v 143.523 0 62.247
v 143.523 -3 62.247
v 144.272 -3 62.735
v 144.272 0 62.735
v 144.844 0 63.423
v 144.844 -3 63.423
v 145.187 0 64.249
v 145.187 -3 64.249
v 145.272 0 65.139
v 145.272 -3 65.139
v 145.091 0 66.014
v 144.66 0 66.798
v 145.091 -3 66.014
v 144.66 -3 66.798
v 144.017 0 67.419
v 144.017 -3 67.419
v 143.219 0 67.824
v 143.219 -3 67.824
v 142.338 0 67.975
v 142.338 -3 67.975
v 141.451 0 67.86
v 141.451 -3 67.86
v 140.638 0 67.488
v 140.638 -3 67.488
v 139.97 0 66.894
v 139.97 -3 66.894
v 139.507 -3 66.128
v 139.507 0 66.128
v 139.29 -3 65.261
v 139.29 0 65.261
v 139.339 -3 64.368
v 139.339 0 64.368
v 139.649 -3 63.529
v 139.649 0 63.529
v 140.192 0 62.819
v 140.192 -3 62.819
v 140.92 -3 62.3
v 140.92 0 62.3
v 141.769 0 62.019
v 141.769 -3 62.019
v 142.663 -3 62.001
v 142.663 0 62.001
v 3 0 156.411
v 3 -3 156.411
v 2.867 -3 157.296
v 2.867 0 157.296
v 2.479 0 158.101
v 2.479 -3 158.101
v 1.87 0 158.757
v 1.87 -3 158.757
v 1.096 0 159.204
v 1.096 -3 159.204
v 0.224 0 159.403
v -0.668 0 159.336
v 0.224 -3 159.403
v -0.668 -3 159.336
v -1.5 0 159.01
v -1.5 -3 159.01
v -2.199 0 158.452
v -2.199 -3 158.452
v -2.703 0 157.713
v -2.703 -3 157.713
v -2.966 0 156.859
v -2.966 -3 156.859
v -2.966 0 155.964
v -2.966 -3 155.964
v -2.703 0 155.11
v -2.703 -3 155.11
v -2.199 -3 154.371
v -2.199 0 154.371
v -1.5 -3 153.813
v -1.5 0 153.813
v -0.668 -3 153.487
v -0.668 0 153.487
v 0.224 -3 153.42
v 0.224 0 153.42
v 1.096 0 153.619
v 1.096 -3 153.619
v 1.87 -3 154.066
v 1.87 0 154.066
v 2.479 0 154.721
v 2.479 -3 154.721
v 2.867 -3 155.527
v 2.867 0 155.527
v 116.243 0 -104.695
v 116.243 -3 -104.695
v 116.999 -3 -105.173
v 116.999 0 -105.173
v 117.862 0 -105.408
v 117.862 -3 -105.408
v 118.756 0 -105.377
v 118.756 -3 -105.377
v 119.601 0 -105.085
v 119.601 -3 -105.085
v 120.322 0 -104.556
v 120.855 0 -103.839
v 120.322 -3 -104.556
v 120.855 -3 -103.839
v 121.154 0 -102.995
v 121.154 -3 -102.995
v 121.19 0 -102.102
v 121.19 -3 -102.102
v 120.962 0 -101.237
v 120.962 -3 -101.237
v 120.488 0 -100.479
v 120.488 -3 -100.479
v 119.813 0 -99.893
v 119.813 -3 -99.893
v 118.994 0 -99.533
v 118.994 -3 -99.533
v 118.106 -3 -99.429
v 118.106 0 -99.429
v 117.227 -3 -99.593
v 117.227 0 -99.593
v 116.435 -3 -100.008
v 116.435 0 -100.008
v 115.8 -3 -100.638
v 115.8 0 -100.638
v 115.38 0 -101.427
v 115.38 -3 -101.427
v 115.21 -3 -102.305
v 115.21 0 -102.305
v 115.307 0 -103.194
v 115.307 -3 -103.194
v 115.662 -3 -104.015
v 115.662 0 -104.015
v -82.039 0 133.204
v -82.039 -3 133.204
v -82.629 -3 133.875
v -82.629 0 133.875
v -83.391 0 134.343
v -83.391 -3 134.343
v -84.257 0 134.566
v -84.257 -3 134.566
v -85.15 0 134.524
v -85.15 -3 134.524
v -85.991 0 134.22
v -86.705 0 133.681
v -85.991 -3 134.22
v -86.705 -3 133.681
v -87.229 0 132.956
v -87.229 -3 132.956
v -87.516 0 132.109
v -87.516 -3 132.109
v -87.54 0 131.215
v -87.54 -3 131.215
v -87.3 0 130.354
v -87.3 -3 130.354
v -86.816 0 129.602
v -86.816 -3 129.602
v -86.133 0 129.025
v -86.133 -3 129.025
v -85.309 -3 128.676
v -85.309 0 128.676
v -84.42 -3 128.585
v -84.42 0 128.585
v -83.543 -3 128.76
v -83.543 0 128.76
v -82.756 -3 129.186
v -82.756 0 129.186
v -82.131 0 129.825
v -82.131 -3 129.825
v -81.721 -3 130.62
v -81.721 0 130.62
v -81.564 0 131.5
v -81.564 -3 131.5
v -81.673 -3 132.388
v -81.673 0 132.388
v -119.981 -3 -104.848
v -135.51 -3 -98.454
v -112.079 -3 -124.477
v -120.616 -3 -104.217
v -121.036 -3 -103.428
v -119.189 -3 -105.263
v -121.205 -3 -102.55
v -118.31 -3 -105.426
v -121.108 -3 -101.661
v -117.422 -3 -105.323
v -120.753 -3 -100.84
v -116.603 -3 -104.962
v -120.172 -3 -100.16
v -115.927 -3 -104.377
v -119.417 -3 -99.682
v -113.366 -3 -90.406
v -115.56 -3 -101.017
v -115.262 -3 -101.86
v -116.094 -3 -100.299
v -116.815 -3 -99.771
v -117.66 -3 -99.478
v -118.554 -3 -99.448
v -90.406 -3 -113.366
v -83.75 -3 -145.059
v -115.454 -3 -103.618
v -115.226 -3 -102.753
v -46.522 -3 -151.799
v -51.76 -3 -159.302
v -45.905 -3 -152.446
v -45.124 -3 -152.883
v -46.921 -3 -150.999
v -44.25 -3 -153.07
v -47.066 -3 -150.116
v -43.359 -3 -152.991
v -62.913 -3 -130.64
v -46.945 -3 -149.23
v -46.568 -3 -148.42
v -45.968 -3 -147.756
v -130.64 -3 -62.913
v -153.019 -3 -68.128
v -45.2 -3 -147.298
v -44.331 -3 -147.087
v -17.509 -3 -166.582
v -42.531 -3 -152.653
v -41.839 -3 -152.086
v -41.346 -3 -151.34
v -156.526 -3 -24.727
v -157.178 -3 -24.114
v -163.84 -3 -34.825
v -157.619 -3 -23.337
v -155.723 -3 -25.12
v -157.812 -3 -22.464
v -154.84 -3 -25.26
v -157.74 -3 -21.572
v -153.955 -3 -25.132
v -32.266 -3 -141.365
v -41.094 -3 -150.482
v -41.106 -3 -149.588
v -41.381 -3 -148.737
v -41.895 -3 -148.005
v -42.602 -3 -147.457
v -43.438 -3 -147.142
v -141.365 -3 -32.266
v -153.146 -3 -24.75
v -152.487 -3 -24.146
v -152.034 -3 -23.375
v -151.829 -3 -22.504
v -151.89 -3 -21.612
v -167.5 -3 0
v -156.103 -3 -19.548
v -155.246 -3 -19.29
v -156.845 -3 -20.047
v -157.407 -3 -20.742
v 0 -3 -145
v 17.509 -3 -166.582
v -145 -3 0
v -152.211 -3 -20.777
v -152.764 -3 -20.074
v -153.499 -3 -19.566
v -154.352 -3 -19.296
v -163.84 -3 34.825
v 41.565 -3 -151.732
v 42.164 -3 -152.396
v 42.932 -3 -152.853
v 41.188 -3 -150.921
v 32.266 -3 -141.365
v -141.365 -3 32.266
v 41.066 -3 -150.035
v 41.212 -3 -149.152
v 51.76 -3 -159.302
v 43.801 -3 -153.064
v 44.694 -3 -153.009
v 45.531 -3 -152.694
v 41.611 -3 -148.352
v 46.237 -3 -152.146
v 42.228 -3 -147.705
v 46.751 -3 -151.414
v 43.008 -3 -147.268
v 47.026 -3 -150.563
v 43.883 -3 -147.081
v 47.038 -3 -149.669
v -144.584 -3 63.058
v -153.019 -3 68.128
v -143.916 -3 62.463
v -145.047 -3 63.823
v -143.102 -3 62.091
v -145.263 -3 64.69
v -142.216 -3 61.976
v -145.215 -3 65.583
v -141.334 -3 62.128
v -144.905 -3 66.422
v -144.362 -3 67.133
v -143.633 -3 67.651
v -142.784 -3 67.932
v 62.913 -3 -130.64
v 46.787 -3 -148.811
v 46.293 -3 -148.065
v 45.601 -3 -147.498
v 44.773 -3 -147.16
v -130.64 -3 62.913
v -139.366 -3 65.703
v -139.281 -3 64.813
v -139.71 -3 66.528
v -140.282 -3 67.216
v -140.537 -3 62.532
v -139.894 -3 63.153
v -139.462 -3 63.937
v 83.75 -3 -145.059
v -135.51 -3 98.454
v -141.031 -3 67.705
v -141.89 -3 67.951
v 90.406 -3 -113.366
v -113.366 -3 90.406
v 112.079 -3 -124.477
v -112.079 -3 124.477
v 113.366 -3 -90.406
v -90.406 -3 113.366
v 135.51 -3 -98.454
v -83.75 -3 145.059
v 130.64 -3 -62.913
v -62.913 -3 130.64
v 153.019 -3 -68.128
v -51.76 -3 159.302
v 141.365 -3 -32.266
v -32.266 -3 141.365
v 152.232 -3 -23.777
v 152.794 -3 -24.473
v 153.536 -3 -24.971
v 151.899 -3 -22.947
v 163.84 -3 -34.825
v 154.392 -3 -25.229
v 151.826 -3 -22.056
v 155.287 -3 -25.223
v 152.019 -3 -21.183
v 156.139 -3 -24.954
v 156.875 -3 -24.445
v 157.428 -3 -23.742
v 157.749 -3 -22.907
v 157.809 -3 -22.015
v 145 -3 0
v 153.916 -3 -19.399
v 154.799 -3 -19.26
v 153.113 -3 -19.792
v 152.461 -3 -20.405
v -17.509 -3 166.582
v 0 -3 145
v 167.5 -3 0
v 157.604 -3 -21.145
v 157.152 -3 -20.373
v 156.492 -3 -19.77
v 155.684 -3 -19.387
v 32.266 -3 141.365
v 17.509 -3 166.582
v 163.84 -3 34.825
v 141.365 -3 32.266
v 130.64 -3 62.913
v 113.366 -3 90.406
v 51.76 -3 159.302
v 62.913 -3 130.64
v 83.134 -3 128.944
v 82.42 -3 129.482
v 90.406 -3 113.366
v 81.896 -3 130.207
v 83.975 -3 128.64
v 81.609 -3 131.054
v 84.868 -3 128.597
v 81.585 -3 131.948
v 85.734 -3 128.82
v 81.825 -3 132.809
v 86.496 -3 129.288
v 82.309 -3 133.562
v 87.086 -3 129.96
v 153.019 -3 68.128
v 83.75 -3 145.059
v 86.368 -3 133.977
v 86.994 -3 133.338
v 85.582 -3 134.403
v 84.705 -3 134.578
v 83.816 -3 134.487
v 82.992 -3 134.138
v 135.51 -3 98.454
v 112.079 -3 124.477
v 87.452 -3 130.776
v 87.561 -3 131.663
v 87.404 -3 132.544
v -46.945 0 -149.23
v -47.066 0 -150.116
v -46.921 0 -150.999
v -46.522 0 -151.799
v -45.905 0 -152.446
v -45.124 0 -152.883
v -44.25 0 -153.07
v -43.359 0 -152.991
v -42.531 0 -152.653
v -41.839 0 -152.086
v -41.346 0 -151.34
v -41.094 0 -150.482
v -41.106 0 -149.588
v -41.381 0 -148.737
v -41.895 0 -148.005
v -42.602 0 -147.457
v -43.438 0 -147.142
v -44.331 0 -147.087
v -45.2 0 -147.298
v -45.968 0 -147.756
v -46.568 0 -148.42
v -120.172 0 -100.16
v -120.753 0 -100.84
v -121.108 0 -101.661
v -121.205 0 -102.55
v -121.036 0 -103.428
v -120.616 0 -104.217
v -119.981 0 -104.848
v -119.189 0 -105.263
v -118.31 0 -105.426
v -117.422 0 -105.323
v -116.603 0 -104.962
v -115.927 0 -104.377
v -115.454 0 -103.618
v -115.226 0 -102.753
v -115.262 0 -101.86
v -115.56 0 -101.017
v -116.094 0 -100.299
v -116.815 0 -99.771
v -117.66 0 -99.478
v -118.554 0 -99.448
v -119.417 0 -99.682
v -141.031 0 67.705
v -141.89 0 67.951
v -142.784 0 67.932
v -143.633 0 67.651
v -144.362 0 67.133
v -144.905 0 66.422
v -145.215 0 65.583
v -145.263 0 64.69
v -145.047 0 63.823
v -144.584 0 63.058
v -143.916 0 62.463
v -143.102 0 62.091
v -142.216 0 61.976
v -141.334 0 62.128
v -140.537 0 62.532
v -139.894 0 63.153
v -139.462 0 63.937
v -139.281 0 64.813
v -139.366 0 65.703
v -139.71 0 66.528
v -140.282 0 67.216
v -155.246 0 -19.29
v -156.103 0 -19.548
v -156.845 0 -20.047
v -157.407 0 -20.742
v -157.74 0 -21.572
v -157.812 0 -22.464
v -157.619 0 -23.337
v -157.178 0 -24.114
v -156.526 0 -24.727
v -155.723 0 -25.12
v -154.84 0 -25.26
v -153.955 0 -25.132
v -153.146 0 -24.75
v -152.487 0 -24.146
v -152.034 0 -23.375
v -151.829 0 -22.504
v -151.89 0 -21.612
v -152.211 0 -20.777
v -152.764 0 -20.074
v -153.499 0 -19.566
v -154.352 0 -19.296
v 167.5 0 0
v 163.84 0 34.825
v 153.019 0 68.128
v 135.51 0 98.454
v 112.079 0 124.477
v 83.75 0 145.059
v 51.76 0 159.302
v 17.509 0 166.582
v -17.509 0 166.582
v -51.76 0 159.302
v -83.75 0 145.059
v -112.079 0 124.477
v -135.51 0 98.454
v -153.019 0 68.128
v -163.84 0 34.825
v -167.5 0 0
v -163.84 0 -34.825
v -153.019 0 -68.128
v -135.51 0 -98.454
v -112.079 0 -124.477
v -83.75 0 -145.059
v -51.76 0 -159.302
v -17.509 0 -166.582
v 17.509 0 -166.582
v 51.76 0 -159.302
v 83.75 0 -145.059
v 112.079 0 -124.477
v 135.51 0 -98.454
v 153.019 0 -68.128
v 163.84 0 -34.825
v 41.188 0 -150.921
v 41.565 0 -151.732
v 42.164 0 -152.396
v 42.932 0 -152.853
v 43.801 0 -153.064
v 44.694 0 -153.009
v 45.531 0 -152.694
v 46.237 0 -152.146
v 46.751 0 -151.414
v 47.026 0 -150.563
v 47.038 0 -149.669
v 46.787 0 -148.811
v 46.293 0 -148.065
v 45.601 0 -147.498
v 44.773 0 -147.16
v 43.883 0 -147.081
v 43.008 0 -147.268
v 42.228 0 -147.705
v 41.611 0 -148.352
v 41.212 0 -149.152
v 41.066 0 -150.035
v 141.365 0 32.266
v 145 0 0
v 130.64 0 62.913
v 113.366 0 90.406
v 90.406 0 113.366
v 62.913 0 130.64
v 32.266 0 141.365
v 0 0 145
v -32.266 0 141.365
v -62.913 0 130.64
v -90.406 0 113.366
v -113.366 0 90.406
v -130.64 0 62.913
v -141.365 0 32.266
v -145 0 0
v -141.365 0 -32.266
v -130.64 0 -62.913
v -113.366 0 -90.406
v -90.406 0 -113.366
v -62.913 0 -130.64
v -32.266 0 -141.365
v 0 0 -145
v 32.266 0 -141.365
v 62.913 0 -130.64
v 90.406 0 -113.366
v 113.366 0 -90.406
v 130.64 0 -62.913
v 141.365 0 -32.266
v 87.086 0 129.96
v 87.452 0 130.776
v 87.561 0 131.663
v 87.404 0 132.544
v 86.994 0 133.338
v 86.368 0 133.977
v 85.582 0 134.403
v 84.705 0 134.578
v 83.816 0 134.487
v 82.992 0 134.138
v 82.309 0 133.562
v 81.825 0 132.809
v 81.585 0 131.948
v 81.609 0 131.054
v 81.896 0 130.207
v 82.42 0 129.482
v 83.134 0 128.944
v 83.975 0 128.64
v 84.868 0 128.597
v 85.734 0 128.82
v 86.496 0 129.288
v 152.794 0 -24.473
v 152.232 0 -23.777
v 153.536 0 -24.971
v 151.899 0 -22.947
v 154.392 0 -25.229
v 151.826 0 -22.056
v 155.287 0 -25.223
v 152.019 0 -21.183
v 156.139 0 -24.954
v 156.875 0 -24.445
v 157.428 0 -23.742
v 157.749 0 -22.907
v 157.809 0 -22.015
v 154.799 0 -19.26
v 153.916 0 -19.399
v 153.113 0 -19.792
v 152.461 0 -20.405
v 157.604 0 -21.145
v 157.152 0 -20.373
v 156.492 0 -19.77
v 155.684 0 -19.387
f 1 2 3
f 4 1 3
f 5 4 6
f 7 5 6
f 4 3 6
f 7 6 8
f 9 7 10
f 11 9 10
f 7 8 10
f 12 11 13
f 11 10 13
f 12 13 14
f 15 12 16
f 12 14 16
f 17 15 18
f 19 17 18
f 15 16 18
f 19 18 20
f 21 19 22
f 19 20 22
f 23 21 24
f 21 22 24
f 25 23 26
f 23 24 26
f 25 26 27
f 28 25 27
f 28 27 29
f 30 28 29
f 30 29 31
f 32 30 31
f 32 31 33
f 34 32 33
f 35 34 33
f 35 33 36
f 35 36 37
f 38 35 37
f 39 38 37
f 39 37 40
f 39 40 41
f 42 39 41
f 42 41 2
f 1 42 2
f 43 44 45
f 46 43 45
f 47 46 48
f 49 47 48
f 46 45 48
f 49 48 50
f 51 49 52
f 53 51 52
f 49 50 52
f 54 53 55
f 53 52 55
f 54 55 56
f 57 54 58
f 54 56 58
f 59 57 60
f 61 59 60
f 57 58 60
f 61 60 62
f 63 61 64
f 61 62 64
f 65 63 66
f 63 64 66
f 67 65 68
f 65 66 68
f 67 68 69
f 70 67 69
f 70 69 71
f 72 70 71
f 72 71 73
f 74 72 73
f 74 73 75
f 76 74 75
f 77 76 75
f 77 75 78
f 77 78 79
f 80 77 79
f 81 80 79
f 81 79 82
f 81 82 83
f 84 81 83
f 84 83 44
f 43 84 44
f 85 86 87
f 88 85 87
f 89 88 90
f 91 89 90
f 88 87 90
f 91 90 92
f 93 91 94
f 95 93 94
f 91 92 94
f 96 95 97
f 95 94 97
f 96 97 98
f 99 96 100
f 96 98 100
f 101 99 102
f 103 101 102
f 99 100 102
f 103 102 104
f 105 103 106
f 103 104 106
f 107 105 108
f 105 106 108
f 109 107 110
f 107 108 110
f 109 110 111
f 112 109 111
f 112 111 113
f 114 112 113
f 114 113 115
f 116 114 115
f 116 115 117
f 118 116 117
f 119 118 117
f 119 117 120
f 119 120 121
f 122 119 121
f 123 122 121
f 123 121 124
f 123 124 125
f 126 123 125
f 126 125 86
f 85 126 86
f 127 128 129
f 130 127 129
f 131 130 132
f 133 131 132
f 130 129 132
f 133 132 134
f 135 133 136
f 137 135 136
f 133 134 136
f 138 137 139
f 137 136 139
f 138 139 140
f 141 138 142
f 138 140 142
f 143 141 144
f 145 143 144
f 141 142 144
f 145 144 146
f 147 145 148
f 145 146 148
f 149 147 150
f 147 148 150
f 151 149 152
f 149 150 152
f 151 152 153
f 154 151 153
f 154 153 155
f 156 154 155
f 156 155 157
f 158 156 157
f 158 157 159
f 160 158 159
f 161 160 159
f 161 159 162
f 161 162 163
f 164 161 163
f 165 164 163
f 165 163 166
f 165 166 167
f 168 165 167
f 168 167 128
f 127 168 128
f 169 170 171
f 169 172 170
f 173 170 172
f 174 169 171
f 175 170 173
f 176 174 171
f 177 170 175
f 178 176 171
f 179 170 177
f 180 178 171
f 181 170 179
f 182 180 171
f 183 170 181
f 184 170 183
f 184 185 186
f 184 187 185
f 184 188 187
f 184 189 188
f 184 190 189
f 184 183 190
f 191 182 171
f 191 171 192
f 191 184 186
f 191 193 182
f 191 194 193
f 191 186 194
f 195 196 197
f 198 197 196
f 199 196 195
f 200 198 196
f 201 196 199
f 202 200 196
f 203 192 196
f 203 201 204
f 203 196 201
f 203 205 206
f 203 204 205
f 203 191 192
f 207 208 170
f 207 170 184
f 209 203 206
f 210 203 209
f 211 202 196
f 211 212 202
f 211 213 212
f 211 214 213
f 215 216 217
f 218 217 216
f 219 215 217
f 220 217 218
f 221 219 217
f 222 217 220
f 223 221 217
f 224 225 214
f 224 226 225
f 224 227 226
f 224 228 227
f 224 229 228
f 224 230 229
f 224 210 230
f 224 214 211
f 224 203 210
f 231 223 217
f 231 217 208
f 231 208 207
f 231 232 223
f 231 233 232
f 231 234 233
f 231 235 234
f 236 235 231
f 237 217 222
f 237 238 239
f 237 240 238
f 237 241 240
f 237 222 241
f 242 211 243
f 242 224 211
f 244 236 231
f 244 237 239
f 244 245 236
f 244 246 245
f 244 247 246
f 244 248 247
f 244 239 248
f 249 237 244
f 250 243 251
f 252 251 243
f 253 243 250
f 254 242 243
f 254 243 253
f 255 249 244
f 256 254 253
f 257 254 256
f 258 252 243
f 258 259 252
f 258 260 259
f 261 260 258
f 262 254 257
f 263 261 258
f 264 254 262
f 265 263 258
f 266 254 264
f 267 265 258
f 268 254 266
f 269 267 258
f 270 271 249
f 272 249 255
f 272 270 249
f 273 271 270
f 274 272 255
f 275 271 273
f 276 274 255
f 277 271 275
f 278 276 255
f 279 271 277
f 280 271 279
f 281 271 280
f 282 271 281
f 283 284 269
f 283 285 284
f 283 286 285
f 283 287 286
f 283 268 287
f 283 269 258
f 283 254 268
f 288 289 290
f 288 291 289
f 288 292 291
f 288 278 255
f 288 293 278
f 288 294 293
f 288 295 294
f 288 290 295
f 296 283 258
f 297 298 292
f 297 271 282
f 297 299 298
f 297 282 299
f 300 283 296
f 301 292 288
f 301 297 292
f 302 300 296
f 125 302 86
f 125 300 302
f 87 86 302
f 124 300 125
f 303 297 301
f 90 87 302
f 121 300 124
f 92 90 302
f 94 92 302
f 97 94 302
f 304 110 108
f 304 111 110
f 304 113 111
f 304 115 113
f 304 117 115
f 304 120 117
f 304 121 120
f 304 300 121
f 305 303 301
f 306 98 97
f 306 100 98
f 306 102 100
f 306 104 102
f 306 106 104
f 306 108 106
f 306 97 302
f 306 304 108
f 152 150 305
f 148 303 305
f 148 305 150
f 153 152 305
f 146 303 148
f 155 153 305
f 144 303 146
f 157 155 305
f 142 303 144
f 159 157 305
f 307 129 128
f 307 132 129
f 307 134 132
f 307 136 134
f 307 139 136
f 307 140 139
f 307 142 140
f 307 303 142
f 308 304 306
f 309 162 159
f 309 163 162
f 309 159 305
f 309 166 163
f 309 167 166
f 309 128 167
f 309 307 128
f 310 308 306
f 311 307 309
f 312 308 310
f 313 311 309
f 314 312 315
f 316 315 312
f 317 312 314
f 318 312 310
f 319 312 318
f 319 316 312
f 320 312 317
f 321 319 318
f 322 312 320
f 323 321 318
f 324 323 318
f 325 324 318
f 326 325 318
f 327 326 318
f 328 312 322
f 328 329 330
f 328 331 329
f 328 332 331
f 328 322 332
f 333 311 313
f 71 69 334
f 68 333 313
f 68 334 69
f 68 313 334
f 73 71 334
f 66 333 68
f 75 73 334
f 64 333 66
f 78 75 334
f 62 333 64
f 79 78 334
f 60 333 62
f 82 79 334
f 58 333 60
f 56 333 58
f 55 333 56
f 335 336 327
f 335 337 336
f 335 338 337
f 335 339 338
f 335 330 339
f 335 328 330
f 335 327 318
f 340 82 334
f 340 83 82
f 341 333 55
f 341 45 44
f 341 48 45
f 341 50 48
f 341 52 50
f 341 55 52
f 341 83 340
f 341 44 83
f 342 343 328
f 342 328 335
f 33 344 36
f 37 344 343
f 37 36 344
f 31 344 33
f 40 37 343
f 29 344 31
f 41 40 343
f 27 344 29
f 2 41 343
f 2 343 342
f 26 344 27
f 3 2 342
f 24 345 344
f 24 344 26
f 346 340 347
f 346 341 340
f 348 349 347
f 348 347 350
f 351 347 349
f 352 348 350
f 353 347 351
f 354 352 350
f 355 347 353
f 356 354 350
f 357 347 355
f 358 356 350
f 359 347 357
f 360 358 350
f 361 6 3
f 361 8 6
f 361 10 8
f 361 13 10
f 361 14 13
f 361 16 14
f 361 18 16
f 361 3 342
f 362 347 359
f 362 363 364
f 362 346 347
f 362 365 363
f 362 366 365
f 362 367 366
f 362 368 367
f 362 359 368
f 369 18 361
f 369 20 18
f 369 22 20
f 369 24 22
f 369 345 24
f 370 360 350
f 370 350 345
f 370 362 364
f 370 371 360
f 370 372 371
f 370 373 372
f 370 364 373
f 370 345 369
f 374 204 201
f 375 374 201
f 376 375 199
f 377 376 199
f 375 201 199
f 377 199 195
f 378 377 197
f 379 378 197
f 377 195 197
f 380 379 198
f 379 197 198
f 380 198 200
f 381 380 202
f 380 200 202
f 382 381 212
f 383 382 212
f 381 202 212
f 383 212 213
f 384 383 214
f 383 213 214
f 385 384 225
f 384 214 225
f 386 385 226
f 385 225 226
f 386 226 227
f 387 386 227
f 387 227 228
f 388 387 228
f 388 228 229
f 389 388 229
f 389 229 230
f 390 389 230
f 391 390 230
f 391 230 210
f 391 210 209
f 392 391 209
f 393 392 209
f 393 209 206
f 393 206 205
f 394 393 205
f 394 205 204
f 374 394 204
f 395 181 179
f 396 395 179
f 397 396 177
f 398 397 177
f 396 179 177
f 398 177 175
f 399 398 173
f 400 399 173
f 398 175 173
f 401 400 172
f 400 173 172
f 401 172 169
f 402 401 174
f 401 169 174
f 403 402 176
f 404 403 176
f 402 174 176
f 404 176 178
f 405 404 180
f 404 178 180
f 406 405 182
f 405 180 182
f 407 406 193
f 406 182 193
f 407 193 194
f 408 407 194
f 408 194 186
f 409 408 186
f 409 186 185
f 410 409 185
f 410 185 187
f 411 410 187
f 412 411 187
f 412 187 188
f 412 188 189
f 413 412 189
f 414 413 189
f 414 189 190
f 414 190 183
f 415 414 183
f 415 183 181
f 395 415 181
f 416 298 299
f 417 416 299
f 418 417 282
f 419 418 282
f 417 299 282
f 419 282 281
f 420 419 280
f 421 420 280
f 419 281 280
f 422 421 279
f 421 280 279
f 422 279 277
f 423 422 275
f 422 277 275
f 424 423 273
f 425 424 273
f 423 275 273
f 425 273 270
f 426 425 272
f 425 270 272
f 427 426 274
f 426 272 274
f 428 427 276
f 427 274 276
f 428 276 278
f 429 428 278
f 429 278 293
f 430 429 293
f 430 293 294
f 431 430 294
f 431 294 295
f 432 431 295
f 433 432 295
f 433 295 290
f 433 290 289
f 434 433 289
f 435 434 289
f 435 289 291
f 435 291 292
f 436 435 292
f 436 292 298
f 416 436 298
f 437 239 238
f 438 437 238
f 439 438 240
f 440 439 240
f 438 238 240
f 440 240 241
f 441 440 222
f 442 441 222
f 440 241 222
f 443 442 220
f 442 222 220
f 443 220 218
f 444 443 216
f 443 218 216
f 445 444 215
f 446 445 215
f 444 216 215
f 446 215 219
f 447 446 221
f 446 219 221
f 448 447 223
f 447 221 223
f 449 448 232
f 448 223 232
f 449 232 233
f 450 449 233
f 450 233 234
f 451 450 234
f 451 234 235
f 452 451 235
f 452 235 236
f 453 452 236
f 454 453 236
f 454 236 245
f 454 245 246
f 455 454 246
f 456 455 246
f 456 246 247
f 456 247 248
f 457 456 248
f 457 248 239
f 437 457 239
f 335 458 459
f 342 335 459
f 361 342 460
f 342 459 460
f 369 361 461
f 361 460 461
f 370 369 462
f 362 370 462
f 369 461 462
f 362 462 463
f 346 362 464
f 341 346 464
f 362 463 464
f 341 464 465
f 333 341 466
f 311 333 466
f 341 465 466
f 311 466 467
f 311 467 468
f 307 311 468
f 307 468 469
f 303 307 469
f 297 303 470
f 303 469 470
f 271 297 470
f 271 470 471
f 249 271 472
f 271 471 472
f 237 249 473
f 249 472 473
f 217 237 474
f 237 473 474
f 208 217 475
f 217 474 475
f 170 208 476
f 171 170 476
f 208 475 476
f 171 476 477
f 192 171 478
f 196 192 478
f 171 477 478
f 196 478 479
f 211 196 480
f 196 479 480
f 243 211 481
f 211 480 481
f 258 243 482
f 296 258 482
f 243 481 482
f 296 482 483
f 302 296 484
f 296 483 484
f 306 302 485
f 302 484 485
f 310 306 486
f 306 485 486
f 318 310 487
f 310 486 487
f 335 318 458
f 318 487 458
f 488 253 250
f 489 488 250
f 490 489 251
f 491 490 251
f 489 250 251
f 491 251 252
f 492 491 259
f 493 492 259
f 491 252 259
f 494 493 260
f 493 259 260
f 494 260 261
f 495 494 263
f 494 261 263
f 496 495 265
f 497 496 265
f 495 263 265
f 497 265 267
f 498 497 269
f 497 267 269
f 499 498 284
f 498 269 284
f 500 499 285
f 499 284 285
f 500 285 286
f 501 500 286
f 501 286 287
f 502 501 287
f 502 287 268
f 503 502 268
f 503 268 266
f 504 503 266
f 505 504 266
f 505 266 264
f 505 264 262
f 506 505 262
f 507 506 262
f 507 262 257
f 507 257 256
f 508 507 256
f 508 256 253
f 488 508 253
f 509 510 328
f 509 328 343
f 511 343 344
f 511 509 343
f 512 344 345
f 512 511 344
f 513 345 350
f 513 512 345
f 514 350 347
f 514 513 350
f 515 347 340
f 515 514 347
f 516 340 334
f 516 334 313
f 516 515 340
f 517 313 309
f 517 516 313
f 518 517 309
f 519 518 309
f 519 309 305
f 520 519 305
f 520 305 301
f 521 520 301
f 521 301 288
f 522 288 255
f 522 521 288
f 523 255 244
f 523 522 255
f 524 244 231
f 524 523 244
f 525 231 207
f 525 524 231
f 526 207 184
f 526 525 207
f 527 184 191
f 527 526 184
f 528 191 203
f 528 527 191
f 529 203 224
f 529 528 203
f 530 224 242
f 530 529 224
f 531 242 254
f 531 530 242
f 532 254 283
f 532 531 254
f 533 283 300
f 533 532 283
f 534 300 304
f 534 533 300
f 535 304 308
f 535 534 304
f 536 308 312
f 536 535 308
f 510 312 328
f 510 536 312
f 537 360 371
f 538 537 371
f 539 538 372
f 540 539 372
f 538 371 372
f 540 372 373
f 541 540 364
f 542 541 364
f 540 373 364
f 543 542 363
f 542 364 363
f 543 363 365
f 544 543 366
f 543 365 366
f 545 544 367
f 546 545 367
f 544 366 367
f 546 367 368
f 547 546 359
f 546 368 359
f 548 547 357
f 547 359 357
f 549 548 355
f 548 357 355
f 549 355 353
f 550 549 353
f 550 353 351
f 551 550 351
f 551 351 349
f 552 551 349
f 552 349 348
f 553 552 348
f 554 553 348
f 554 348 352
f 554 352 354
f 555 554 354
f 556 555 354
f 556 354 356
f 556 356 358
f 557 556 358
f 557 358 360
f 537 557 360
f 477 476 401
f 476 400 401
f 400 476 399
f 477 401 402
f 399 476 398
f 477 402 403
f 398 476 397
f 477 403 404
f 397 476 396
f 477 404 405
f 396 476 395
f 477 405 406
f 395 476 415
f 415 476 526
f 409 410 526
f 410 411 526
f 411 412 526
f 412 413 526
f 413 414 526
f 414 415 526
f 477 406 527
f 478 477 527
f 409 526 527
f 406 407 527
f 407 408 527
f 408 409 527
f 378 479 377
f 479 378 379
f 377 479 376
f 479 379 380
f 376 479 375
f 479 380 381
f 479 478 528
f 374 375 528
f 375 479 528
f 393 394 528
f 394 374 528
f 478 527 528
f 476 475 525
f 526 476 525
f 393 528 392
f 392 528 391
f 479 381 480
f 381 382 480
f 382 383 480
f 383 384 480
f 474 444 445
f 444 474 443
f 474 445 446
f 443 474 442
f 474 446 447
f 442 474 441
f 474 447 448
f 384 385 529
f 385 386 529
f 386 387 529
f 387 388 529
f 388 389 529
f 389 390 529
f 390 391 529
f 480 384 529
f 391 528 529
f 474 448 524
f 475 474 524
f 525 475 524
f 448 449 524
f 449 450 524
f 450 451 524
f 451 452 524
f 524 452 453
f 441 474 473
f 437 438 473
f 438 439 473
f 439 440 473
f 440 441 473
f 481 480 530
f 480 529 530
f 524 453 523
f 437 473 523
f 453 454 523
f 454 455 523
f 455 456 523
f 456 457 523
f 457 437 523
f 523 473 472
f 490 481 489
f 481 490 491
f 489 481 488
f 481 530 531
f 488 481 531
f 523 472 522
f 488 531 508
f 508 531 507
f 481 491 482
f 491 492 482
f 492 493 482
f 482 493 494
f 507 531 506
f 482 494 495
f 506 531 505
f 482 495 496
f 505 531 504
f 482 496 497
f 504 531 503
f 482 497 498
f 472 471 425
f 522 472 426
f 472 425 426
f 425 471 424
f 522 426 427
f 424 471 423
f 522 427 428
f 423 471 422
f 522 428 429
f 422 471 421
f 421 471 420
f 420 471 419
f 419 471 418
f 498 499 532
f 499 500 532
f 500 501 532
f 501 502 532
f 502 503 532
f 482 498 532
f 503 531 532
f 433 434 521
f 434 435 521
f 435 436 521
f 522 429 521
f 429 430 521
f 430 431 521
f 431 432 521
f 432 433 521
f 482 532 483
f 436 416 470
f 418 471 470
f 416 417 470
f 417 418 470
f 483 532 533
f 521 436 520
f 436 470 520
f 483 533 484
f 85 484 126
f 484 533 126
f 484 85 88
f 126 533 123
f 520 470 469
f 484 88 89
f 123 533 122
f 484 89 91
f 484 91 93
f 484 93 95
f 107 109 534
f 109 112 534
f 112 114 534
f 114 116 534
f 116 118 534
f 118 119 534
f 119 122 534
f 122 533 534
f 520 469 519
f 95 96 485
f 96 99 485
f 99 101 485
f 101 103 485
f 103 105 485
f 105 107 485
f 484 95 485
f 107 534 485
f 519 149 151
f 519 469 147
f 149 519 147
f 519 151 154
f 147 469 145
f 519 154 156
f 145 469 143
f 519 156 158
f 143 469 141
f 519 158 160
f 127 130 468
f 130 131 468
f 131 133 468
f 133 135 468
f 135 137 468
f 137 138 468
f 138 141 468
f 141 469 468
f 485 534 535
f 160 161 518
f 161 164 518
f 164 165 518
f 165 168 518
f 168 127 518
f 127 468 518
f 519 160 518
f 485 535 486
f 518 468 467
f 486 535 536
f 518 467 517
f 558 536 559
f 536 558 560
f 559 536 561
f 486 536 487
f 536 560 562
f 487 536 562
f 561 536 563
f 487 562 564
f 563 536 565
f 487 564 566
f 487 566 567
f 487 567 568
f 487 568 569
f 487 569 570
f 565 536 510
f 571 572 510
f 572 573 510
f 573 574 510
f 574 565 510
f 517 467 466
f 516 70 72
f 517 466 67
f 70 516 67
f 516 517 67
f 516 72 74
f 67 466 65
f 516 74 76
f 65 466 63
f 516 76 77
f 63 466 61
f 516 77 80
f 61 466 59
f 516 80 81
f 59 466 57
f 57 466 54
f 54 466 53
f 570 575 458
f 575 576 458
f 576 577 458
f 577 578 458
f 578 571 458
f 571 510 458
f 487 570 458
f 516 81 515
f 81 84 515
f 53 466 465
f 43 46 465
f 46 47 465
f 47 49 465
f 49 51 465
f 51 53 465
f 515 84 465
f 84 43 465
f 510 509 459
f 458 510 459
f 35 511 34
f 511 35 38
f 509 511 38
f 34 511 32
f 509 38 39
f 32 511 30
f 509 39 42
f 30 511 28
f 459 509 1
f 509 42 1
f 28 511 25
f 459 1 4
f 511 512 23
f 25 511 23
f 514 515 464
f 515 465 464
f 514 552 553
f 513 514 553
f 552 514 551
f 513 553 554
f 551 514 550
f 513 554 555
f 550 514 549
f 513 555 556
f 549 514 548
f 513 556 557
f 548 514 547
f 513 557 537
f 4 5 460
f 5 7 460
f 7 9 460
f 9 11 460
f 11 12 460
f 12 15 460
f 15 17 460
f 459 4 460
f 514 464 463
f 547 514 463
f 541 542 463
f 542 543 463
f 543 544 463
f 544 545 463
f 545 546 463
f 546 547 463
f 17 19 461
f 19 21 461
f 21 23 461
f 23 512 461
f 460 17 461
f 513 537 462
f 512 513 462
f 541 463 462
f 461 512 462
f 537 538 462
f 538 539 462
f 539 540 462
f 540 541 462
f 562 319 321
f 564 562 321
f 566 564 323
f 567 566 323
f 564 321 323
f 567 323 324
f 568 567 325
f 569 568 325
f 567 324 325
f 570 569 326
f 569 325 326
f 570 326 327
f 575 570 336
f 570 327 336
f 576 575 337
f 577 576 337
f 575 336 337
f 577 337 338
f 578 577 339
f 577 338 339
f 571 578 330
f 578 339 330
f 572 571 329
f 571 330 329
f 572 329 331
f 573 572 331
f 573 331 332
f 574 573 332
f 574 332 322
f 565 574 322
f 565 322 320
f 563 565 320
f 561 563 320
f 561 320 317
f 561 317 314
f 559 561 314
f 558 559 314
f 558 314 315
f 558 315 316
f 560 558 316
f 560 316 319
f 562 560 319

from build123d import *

# Parameters (mm, degrees)
F0_R            = 167.5
F0_R_2          = 145
F1_DEPTH        = 3
F2_R            = 3
F3_DEPTH        = 25
F3_COPIES_COUNT = 11


# Not quite as in the source:
# - a pattern or mirror of a feature is missing from the dataset's text; its kind, count and spacing are read off the source's solid


with BuildPart() as f1:
    # F0 (on Front) → F1 (new body)
    with BuildSketch(Plane.XZ):
        Circle(F0_R)
        Circle(F0_R_2, mode=Mode.SUBTRACT)
    extrude(amount=F1_DEPTH)

    # F2 (on face) → F3 (cut)
    with BuildSketch(Plane.XZ.offset(3)):
        with Locations((0, 156.4114242792)):
            Circle(F2_R)
    f3 = extrude(amount=-F3_DEPTH, mode=Mode.SUBTRACT)

    # F3_copies: F3 ×11 about axis
    f3_copies_axis = Axis((0, 0, 0), (0, 1, 0))
    for i in range(1, F3_COPIES_COUNT):
        add(f3.rotate(f3_copies_axis, i * 360 / F3_COPIES_COUNT), mode=Mode.SUBTRACT)


solid = f1.part
